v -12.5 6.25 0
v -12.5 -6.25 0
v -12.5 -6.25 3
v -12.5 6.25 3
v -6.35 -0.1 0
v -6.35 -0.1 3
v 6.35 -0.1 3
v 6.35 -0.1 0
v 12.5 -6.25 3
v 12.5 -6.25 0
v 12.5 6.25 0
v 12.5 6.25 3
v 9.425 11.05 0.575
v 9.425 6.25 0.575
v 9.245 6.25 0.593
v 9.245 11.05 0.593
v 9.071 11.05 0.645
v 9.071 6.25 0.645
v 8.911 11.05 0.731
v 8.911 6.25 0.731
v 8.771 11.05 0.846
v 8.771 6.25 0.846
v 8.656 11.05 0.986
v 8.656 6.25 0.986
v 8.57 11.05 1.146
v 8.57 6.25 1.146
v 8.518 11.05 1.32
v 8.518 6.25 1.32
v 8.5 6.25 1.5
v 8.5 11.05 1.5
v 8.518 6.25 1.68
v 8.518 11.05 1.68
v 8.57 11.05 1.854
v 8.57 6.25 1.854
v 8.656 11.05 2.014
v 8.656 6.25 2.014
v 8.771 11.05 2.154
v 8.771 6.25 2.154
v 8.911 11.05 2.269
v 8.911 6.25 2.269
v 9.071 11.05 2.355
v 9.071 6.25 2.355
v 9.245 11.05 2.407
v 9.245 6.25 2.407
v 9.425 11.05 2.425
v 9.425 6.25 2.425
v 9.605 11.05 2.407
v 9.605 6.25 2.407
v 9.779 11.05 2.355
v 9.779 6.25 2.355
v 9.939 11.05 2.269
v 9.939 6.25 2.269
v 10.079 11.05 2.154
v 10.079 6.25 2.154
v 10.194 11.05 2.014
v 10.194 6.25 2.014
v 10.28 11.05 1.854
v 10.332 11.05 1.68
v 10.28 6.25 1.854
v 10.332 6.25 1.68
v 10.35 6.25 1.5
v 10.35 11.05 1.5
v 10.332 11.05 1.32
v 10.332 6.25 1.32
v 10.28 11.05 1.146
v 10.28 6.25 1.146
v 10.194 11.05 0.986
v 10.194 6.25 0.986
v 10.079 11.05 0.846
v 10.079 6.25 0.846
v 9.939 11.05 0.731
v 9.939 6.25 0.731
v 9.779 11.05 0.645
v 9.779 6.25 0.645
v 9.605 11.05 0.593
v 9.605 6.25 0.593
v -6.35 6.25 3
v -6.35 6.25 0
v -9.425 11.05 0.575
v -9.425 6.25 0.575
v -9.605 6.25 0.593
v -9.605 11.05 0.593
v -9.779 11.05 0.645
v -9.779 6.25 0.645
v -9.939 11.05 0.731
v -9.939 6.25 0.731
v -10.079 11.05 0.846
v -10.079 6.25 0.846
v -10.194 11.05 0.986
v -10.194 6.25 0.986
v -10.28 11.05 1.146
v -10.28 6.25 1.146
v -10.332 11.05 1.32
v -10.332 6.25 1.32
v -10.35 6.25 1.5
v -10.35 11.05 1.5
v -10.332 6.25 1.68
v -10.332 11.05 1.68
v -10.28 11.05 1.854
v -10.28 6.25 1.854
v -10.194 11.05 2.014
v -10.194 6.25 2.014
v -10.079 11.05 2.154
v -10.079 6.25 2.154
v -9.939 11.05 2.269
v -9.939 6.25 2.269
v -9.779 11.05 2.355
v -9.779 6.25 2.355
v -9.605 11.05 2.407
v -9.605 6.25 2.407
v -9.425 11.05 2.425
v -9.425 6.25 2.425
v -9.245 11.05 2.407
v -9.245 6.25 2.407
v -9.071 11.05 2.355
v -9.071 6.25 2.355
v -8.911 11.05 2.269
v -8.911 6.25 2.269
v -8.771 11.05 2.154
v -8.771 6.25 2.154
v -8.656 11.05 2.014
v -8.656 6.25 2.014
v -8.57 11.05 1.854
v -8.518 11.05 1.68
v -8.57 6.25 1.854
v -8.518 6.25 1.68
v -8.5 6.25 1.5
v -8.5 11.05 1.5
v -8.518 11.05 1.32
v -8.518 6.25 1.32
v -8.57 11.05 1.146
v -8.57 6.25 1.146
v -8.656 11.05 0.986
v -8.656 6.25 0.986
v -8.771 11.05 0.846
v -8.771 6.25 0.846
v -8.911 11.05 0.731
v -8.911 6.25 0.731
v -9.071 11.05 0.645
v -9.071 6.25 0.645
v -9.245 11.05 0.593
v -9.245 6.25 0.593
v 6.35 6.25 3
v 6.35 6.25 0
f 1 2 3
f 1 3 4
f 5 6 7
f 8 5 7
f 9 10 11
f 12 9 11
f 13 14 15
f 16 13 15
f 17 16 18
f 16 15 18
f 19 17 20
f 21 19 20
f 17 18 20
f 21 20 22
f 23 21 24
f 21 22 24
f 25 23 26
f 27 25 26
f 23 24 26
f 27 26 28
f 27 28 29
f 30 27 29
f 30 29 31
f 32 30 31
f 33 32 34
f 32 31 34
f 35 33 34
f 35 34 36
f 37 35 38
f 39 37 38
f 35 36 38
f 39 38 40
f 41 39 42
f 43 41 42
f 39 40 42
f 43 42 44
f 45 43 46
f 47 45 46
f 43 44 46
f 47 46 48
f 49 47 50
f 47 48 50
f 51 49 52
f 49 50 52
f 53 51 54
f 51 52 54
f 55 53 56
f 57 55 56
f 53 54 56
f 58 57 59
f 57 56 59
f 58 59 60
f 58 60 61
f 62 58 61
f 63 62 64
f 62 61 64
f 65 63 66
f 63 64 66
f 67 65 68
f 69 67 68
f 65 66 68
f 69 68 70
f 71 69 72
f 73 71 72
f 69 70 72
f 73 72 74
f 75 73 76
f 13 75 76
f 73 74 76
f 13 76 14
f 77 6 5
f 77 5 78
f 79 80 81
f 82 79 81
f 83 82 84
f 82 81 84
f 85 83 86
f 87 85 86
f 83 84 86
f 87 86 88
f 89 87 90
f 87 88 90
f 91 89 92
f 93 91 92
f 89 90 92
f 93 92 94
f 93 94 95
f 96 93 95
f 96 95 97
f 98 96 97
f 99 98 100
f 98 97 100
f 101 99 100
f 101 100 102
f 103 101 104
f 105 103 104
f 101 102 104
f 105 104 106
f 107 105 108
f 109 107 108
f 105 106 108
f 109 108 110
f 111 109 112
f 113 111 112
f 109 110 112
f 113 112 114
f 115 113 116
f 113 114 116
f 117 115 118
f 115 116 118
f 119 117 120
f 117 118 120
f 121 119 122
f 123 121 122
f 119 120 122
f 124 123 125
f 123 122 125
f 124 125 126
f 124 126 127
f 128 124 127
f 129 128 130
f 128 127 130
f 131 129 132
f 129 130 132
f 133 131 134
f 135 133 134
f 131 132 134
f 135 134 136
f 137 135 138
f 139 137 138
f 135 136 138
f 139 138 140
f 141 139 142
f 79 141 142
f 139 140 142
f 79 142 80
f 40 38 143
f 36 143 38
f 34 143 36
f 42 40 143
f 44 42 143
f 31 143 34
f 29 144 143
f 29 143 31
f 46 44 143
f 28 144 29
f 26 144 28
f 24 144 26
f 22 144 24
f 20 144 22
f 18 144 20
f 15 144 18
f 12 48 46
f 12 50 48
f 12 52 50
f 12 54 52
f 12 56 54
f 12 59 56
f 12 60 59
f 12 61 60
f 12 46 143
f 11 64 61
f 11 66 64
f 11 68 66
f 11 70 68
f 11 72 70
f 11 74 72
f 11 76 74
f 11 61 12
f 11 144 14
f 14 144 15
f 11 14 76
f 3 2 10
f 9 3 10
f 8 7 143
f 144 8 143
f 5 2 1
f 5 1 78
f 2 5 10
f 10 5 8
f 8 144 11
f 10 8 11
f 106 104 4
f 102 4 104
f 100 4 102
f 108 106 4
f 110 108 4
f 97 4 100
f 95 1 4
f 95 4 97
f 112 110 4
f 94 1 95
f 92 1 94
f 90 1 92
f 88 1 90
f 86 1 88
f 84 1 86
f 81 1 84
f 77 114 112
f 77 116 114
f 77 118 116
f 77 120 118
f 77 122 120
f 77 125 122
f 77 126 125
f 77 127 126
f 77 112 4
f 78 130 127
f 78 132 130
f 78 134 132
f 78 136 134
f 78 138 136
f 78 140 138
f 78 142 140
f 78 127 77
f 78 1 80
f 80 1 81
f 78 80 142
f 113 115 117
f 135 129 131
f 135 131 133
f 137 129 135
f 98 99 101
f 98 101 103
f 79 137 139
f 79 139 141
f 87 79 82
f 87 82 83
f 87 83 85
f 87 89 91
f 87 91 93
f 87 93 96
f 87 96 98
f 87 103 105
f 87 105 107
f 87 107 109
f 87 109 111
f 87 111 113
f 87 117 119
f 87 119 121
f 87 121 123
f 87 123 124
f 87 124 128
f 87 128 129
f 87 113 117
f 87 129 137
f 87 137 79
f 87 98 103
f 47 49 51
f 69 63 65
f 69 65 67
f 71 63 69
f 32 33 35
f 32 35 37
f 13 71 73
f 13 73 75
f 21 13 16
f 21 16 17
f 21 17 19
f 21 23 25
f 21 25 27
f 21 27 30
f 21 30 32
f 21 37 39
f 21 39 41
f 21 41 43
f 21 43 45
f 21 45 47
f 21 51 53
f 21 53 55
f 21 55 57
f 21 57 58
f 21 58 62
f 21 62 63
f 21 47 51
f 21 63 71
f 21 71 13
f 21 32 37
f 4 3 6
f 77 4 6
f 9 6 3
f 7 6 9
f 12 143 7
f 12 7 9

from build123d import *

# Parameters (mm, degrees)
SKETCH1_W           = 25
SKETCH1_H           = 12.5
BOSS_EXTRUDE1_DEPTH = 3
SKETCH2_W           = 12.7
SKETCH2_H           = 6.35
CUT_EXTRUDE1_DEPTH  = 3
SKETCH3_R           = 0.925
BOSS_EXTRUDE2_DEPTH = 4.8


with BuildPart() as part:
    # Sketch1 → Boss-Extrude1 (new body)
    with BuildSketch(Plane.XY):
        Rectangle(SKETCH1_W, SKETCH1_H)
    extrude(amount=BOSS_EXTRUDE1_DEPTH)

    # Sketch2 → Cut-Extrude1 (cut)
    with BuildSketch(Plane.XY.offset(3)):
        with Locations((0, 3.075)):
            Rectangle(SKETCH2_W, SKETCH2_H)
    extrude(amount=-CUT_EXTRUDE1_DEPTH, mode=Mode.SUBTRACT)

    # Sketch3 → Boss-Extrude2 (add)
    with BuildSketch(Plane(origin=(0, 6.25, 0), x_dir=(1, 0, 0), z_dir=(0, 1, 0))):
        with Locations(Location((-9.425, -1.5, 0), (0, 0, 90))):
            Circle(SKETCH3_R)
        with Locations(Location((9.425, -1.5, 0), (0, 0, 90))):
            Circle(SKETCH3_R)
    extrude(amount=BOSS_EXTRUDE2_DEPTH)


solid = part.part
